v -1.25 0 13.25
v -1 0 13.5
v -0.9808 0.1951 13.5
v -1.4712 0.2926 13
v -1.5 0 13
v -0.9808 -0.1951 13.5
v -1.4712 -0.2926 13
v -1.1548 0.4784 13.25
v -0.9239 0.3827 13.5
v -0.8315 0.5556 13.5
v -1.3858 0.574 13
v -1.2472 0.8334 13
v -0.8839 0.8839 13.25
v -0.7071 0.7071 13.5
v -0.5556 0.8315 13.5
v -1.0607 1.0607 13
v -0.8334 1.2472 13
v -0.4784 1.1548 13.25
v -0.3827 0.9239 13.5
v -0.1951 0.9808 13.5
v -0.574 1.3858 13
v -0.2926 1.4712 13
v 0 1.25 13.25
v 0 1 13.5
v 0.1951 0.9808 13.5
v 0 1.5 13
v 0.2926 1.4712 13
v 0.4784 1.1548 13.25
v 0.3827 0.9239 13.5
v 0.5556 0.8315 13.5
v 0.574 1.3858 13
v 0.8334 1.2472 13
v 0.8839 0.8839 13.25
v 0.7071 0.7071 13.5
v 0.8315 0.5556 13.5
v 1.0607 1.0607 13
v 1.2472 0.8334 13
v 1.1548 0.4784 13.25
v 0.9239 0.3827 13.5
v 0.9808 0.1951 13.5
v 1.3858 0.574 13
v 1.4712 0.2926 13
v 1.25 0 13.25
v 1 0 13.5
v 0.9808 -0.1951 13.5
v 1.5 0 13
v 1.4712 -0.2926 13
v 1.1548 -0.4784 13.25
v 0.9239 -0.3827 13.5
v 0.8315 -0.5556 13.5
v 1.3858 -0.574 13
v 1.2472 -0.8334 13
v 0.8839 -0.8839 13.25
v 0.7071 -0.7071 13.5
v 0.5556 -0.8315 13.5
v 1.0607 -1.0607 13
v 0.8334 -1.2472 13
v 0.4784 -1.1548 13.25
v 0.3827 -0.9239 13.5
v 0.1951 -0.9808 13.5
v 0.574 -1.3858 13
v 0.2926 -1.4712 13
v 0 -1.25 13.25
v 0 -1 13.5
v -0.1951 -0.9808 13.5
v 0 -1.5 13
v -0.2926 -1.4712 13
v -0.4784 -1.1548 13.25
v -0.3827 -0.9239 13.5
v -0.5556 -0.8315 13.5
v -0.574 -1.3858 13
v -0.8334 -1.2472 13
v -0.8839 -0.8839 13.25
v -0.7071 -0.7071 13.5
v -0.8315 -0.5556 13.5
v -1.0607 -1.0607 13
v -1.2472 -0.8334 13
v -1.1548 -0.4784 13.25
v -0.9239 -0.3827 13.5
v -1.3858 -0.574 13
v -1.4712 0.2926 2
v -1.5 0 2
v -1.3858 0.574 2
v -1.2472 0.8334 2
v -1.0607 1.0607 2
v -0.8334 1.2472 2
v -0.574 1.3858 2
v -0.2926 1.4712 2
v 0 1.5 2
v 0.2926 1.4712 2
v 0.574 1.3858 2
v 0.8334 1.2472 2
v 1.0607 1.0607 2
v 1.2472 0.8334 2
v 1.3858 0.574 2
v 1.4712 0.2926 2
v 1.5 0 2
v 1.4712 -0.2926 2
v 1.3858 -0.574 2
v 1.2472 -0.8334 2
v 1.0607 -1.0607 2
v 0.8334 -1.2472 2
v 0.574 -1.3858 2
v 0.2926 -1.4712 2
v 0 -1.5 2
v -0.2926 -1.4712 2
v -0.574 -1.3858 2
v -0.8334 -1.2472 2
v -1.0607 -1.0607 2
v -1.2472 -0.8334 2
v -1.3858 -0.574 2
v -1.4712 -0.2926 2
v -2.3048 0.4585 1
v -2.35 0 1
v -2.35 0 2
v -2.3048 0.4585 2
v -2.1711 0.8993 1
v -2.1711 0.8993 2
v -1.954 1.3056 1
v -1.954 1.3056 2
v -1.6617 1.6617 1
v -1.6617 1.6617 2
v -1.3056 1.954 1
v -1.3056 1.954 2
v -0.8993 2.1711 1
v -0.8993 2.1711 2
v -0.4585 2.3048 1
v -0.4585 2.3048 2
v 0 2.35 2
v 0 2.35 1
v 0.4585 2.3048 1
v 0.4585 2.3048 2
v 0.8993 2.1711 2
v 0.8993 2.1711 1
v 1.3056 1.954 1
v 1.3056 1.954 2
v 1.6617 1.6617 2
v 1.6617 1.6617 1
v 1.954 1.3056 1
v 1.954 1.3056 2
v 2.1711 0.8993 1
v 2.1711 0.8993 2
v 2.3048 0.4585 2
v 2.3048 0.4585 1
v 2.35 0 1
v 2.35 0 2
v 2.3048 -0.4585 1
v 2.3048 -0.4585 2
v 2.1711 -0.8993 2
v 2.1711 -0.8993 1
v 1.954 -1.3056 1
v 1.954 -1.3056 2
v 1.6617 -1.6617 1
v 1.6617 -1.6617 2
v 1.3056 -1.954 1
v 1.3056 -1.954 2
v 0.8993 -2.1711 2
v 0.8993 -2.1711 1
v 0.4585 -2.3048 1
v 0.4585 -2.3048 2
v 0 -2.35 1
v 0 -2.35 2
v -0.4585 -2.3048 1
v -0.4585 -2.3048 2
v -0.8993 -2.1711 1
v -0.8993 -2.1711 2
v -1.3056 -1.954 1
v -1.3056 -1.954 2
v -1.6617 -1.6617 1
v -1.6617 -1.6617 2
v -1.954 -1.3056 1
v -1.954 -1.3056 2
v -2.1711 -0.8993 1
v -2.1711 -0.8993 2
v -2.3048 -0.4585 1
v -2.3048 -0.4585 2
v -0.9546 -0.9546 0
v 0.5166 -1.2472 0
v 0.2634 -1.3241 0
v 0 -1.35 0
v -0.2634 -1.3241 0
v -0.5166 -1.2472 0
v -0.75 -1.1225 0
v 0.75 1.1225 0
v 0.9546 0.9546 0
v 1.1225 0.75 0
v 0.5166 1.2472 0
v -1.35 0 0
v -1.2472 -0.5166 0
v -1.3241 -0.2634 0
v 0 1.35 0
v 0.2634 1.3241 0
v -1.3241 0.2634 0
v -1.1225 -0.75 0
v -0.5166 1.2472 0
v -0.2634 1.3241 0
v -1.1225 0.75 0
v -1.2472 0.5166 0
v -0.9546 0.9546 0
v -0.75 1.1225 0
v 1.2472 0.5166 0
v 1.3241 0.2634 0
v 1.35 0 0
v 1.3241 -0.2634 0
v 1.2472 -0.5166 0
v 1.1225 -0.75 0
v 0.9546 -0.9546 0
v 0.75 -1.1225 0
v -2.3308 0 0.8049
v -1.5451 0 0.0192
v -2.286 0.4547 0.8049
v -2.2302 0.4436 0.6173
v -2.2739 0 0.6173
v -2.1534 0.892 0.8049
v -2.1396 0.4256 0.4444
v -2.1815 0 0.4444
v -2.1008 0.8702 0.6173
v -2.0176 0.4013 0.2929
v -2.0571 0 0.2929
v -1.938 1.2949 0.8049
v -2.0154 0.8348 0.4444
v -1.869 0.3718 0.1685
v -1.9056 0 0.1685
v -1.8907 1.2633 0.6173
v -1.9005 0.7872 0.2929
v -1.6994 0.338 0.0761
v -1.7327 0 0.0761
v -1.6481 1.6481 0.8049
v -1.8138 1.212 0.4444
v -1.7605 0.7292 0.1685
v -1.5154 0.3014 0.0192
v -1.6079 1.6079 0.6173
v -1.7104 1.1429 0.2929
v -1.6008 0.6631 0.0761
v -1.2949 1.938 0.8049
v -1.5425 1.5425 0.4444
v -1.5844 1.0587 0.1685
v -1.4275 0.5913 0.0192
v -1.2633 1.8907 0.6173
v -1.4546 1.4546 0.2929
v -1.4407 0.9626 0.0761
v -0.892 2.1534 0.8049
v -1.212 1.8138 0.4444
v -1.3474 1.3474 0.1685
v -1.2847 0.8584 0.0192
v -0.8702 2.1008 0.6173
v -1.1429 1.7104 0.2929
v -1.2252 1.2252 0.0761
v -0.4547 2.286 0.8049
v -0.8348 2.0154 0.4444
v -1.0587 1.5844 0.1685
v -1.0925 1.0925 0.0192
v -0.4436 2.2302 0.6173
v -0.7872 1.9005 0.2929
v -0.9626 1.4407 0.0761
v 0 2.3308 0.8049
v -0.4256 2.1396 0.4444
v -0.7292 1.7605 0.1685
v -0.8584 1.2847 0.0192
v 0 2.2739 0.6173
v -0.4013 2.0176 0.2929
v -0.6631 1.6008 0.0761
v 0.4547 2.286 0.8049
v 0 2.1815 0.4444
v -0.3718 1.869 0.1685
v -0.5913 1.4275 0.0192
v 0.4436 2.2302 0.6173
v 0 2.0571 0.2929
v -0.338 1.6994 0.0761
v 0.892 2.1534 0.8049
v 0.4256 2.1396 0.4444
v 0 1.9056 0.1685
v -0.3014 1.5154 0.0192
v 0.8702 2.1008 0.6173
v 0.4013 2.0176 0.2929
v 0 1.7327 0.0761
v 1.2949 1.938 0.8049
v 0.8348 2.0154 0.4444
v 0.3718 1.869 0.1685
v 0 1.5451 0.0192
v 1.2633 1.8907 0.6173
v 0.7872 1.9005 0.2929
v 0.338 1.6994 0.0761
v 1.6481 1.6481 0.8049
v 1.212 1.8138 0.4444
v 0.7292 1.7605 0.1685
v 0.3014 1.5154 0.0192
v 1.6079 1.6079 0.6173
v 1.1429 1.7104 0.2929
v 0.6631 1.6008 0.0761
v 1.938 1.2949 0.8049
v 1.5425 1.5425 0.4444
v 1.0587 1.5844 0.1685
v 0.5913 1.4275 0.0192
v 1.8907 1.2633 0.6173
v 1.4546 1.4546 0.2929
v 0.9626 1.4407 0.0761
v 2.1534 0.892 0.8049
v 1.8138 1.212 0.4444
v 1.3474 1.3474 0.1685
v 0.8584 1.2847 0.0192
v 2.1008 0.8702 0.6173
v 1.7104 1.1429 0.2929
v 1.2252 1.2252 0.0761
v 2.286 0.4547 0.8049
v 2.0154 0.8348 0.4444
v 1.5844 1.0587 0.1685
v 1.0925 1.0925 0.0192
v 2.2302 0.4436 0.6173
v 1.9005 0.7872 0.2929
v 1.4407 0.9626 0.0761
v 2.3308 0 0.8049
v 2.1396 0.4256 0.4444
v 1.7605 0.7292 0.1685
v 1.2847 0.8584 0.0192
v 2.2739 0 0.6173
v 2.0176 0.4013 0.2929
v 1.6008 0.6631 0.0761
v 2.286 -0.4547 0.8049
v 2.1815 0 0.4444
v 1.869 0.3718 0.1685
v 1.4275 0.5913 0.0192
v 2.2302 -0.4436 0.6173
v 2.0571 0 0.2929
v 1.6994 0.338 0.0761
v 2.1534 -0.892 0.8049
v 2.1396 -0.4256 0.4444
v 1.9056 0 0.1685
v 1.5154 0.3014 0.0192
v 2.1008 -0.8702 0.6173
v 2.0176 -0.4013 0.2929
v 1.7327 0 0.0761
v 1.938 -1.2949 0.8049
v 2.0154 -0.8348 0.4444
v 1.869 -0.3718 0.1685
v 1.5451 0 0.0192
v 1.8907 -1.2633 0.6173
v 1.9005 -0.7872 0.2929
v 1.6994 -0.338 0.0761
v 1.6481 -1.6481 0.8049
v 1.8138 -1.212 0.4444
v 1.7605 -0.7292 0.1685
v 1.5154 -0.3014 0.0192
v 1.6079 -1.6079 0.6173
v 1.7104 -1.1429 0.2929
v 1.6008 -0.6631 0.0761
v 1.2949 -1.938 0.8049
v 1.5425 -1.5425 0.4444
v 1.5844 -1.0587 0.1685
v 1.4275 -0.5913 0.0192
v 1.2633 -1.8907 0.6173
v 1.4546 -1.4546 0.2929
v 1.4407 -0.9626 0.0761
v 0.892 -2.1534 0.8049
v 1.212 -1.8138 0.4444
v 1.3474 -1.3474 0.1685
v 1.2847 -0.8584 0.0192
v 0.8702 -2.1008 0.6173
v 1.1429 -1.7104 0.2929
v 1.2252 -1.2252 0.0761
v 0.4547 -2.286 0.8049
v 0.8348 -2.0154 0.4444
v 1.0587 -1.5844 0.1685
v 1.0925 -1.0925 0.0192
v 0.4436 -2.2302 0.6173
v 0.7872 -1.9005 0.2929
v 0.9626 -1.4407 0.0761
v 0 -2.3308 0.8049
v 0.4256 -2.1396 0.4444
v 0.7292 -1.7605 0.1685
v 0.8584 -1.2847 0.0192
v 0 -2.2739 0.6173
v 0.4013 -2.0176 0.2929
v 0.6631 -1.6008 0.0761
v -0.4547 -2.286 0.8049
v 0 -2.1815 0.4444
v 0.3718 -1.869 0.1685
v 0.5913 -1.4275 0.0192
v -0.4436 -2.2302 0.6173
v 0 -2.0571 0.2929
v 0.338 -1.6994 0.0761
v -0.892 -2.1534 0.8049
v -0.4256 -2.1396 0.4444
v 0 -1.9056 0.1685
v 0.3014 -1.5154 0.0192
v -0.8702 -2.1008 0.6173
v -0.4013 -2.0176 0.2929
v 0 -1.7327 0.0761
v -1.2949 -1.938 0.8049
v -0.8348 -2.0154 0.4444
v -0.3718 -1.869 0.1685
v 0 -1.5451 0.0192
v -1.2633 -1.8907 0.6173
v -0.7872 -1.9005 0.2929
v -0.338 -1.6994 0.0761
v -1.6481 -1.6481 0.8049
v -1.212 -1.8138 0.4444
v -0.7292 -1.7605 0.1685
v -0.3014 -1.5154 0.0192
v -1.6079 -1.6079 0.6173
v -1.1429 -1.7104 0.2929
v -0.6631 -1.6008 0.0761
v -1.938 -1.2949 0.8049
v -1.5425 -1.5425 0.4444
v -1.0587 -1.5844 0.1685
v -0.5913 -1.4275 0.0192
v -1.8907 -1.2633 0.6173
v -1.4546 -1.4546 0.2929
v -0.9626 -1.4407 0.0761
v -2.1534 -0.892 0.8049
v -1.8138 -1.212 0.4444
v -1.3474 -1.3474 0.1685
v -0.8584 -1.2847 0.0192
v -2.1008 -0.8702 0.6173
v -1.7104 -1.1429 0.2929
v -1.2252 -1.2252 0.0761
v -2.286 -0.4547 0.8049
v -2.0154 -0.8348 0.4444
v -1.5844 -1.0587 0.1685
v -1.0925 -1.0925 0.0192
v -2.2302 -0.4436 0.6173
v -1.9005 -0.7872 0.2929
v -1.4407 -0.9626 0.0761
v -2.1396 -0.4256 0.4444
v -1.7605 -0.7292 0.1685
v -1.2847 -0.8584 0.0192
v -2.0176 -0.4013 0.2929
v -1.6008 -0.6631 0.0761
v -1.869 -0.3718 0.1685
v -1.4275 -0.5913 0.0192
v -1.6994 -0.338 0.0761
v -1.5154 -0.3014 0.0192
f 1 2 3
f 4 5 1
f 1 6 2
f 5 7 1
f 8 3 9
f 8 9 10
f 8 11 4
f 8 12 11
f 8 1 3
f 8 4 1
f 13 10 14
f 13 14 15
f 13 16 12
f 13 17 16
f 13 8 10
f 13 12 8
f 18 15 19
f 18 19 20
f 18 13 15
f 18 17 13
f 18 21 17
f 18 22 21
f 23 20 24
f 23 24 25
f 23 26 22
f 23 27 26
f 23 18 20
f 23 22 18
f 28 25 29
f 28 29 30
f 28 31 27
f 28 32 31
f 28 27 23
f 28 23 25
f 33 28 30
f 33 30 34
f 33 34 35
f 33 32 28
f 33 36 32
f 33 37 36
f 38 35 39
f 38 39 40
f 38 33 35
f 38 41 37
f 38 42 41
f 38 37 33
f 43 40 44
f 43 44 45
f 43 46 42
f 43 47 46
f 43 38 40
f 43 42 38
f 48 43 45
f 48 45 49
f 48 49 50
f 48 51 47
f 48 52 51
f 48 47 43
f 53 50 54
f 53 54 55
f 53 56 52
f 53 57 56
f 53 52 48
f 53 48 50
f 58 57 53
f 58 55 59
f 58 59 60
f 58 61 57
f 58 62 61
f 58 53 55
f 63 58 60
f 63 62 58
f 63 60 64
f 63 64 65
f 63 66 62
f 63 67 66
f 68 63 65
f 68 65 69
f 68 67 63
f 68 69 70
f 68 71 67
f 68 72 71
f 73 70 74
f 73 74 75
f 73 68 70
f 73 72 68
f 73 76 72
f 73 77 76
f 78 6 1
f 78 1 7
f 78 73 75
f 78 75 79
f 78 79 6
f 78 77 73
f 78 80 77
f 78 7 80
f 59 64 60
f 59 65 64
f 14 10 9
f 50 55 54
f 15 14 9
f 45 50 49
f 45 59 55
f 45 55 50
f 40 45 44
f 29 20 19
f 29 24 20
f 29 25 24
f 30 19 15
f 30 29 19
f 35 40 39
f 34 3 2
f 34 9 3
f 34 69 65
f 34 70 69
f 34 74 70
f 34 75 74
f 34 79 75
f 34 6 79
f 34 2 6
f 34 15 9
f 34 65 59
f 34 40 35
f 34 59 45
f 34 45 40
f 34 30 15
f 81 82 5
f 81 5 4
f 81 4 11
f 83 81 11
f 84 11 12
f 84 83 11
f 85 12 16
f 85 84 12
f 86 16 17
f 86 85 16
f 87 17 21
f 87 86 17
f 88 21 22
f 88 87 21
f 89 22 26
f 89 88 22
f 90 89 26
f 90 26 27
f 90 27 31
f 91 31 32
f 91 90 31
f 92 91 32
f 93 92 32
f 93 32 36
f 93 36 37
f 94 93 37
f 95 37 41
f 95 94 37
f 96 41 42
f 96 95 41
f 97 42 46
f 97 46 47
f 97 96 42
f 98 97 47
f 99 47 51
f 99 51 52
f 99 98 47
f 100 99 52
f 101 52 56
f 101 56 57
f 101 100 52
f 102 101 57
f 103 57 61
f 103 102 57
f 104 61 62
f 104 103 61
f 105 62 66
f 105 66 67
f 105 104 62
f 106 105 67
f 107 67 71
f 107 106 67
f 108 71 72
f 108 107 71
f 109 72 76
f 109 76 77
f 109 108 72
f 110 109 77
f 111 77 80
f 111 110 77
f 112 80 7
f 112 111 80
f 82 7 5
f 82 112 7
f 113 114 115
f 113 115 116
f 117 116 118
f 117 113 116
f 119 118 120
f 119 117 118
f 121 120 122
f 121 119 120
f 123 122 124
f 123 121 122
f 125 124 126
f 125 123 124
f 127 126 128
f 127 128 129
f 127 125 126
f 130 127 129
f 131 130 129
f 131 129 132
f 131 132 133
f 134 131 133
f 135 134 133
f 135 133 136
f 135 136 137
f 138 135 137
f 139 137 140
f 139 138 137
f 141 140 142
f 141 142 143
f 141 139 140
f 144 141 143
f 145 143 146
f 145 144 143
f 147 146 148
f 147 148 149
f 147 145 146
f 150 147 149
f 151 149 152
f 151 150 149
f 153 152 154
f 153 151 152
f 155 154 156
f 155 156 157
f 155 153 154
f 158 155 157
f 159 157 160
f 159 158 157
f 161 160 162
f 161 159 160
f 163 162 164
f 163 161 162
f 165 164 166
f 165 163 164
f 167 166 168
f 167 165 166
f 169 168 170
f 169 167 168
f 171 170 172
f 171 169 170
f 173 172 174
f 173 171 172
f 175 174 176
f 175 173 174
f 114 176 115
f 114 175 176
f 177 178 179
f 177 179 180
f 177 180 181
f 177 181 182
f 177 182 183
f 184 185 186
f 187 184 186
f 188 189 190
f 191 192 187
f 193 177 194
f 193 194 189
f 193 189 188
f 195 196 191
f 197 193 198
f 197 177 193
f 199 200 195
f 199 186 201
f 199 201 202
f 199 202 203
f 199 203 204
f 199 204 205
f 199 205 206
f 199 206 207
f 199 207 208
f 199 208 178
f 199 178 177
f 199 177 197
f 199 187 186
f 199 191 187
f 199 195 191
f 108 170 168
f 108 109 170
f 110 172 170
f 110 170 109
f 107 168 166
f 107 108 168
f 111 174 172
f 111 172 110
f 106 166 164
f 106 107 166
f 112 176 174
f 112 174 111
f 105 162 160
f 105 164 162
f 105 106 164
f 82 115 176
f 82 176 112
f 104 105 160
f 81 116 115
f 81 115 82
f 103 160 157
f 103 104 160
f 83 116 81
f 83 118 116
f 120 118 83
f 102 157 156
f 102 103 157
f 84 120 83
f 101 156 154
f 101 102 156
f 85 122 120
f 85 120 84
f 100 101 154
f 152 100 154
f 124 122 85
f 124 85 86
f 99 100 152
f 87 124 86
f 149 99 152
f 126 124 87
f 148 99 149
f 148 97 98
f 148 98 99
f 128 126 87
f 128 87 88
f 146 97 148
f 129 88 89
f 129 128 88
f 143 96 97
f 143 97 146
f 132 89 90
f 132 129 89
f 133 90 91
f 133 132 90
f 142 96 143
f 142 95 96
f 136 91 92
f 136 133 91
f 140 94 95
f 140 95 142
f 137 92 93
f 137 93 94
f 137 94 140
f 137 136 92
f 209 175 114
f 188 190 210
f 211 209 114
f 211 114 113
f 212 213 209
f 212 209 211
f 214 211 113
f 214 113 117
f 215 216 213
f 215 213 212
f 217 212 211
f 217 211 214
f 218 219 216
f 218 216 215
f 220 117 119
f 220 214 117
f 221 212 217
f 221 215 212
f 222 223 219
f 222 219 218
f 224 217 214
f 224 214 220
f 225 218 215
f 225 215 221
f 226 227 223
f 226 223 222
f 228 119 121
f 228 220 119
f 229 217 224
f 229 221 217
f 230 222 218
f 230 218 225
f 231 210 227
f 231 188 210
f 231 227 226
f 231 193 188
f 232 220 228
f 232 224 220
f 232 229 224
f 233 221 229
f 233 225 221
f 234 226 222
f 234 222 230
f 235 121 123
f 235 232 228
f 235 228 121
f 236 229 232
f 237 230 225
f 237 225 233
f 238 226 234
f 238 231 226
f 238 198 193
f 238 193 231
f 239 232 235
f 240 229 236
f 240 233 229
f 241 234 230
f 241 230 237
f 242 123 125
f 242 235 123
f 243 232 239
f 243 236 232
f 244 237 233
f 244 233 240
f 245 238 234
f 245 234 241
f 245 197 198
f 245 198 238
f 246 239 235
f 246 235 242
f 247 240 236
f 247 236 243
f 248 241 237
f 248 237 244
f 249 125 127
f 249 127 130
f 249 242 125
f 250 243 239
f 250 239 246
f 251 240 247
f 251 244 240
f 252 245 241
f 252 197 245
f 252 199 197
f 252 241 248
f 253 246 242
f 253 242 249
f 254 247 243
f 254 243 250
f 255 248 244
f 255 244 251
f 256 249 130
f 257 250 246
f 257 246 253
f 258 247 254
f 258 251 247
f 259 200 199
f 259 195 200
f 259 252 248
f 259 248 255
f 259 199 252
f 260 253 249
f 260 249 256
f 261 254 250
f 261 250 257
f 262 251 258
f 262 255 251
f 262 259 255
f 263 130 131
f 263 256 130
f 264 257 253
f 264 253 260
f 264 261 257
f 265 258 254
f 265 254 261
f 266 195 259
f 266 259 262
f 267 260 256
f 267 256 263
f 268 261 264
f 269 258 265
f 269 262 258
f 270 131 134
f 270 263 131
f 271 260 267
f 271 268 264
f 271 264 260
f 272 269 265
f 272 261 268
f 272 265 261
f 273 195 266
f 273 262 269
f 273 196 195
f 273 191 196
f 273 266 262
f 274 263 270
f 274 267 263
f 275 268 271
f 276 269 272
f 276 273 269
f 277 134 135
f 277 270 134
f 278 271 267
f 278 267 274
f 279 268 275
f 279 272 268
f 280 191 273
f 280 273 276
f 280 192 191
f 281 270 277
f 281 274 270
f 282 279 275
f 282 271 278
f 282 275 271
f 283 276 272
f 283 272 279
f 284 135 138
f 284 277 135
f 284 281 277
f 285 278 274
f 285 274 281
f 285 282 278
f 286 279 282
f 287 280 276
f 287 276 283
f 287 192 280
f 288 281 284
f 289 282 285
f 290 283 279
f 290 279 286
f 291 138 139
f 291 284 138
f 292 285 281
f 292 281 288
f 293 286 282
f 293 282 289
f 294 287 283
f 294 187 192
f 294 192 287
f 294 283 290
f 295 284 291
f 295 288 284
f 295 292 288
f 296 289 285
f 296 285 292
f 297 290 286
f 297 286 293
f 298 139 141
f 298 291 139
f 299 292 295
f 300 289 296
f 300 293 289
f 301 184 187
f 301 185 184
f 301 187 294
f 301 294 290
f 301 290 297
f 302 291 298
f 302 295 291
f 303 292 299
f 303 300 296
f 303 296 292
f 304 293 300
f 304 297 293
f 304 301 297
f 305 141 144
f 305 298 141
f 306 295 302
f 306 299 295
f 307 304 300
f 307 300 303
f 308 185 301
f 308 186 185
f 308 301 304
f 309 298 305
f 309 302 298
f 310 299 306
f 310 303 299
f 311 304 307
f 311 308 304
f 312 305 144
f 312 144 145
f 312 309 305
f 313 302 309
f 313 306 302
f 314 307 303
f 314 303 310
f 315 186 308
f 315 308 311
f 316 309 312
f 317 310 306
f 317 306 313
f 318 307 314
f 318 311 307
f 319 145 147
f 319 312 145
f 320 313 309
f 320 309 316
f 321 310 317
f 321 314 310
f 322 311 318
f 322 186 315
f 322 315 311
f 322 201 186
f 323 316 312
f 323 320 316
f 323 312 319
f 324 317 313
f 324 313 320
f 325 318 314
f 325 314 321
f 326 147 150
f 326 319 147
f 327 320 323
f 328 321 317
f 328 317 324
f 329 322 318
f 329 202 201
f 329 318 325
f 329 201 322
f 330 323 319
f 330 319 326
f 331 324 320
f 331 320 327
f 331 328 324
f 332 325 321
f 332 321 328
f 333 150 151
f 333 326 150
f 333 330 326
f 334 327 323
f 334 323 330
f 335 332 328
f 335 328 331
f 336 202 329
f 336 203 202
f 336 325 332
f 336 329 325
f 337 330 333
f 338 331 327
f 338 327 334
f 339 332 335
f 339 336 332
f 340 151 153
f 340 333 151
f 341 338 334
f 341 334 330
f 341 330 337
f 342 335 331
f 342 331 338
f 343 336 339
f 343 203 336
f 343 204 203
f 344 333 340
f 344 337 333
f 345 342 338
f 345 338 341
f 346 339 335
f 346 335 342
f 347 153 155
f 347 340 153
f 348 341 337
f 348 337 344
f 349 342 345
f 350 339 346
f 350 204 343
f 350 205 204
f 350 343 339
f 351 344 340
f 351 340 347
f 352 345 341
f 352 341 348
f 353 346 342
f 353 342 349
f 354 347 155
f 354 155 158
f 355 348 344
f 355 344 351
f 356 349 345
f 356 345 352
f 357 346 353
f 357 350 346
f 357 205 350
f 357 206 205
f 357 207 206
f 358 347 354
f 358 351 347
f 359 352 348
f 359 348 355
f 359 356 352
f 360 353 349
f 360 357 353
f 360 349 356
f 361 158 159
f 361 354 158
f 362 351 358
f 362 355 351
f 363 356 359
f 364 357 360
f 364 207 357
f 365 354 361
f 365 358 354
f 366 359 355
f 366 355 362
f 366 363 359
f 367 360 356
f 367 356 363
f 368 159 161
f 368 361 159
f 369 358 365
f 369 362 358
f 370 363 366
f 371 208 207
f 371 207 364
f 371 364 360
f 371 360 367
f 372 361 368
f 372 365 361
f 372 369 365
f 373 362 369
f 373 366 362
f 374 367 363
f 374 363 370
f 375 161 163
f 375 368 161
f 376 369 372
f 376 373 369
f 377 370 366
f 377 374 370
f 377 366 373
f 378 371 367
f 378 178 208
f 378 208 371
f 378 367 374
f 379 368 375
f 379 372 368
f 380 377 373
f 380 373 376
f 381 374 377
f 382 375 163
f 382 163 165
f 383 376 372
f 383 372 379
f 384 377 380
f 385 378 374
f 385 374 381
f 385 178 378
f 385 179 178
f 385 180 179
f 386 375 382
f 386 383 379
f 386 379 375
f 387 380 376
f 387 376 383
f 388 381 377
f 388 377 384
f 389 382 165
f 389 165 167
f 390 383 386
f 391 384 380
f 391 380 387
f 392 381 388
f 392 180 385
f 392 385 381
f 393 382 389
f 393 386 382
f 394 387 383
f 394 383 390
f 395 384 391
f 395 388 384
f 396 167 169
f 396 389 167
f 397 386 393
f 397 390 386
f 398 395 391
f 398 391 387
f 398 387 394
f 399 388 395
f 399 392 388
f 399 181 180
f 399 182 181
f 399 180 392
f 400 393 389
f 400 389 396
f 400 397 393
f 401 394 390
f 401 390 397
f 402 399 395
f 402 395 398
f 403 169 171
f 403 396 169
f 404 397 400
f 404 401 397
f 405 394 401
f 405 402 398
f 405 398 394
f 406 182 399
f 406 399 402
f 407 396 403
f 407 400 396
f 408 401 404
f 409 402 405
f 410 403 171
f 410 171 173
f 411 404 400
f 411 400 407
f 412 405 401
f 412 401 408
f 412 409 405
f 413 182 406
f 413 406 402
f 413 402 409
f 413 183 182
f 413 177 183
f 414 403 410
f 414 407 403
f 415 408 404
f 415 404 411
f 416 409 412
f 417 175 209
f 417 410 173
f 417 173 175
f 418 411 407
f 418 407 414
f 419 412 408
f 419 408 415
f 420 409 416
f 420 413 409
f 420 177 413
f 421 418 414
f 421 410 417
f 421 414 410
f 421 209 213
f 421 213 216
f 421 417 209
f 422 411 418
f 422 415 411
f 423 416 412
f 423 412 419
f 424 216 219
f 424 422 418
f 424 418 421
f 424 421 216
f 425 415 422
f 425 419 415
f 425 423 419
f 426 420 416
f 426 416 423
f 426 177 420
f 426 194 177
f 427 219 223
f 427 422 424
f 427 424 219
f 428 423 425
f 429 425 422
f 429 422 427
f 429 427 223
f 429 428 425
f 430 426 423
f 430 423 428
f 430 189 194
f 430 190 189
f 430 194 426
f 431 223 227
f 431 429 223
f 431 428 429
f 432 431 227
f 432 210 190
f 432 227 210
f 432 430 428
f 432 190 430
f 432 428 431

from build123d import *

# Parameters (mm, degrees)
F2_SIZE = 0.5
F3_R    = 1


with BuildPart() as f1:
    # F0 (on Front) → F1 (revolve)
    with BuildSketch(Plane.XZ):
        Polygon((0, 13.5), (-1.5, 13.5), (-1.5, 2), (-2.35, 2), (-2.35, 0), (0, 0), align=None)
    revolve(axis=Axis((0, 0, 3.320783), (0, 0, -1)))

    # F2
    f2_edges = [f1.edges().sort_by_distance(p)[0] for p in [
        (1.5, 0, 13.5),
    ]]
    chamfer(f2_edges, length=F2_SIZE)

    # F3
    f3_edges = [f1.edges().sort_by_distance(p)[0] for p in [
        (2.35, 0, 0),
    ]]
    fillet(f3_edges, radius=F3_R)


solid = f1.part
